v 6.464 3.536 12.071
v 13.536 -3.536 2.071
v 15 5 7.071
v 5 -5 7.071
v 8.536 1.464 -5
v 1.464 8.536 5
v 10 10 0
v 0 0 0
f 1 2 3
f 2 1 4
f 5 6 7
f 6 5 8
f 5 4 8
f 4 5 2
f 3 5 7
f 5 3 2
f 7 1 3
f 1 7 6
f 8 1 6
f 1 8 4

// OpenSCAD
rotate(a=45, v=[1,1,0]) { 
	cube(size=[10, 10, 10], center=false);
}
